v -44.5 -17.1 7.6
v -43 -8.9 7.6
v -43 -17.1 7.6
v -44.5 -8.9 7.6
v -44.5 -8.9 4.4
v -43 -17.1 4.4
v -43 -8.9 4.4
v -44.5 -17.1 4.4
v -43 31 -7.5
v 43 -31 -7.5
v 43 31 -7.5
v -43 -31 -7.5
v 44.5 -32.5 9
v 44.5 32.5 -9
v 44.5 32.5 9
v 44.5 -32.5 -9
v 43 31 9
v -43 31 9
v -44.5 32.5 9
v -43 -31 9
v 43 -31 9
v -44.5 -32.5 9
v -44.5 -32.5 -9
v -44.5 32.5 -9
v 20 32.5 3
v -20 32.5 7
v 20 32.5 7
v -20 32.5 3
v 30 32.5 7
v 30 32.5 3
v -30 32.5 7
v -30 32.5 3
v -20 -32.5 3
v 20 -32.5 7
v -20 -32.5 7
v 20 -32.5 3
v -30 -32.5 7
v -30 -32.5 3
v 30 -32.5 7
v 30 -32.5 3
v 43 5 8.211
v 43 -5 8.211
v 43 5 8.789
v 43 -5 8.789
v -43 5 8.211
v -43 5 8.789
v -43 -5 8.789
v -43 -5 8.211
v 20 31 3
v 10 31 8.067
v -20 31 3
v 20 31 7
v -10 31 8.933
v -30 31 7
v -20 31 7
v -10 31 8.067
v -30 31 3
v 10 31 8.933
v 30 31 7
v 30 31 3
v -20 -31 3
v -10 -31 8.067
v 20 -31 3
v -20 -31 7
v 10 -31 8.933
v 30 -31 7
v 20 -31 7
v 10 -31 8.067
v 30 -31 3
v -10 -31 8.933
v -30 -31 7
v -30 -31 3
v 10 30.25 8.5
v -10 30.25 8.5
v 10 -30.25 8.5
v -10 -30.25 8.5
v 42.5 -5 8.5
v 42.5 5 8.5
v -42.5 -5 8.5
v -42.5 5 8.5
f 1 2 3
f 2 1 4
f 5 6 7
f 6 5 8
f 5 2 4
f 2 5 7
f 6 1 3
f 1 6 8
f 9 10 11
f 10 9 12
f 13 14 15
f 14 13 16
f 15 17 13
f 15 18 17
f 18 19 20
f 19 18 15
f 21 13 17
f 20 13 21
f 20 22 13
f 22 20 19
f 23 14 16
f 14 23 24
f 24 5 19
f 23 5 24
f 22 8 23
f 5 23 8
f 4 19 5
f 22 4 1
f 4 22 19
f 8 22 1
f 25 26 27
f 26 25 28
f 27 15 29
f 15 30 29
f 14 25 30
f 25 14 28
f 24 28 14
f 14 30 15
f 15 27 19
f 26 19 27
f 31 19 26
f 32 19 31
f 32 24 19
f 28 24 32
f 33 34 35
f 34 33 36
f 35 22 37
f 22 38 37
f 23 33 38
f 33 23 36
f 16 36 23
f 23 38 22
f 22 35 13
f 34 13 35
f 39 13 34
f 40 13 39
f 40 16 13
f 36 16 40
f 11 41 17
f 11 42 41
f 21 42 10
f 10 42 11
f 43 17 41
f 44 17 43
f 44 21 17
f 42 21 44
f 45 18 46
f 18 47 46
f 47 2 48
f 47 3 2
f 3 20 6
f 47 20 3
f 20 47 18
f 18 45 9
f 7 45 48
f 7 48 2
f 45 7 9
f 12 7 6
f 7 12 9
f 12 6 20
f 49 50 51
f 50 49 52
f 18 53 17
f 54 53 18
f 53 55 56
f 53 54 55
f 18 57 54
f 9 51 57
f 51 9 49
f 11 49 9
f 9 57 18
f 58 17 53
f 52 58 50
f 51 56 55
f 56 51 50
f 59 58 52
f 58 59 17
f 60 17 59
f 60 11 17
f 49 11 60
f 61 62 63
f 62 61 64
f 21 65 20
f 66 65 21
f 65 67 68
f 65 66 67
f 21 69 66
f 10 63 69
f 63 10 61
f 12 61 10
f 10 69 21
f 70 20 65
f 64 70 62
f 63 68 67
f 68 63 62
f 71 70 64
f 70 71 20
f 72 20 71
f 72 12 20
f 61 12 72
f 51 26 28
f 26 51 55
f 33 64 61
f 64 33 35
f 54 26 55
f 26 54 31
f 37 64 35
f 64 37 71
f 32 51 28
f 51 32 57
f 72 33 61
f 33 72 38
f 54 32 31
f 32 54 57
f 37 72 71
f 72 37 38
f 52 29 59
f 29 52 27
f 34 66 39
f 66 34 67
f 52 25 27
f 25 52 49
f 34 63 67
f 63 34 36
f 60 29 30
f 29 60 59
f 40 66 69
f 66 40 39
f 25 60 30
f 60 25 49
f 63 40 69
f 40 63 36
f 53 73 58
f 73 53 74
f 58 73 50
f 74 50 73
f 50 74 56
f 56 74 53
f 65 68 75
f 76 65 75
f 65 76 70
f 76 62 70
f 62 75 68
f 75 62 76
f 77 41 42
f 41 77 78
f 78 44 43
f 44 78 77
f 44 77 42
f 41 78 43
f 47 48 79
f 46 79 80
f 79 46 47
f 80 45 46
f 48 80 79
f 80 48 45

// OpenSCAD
clearance = 0.5;
shell = 1.5;

module ESP() {
	translate([-59/2,0,6])
	cube([6.2,8.2,3.2], center=true);
	cube([59,31,11.5], center=true);
	
}

module HX711() {
	cube([21,35, 11.5], center=true); // HX711
}

module 9V() {
	cube([48,25,15], center=true);
}

module Electronics() {
	translate([-30,0,0]) ESP();
	translate([11,2,0]) HX711();
	translate([-24.5, 16+13+1,0]) 9V();
}

module ElectronicsShell() {
	
	difference() {

		cube([59+21+3+3+shell+shell, 31+3+25+3+shell+shell,15+3], center=true); //outer case
		translate([0,0,shell])
		cube([59+21+3+3, 31+3+25+3,15+3], center=true); // inner shell
	
	translate([17,-13, 0]) Electronics();
	
	translate([-25,0,5])
	cube([10, 200,4], center=true);
	
	mirror([1,0,0])
	translate([-25,0,5])
	cube([10, 200,4], center=true);
	}
	
	translate([0,(31+25+3+3)/2-0.25,(15+3)/2-0.5])
	Notch(20);
	
	mirror([0,1,0])
	translate([0,(31+25+3+3)/2-0.25,(15+3)/2-0.5])
	Notch(20);
	
	
	translate([(59+21+3+3)/2,0,(15+3)/2-0.5])
	rotate([00,0,-90])
	Notch(10);
	
	mirror([1,0,0])
	translate([(59+21+3+3)/2,0,(15+3)/2-0.5])
	rotate([00,0,-90])
	Notch(10);
}

	ElectronicsShell();

	%translate([17,-13, 0])
	Electronics();



module Notch(h=5) {
	rotate([30,0,0])
	rotate([0,90,0])
	cylinder(r=0.5, h = h, $fn=3, center=true);
}

*Notch();
